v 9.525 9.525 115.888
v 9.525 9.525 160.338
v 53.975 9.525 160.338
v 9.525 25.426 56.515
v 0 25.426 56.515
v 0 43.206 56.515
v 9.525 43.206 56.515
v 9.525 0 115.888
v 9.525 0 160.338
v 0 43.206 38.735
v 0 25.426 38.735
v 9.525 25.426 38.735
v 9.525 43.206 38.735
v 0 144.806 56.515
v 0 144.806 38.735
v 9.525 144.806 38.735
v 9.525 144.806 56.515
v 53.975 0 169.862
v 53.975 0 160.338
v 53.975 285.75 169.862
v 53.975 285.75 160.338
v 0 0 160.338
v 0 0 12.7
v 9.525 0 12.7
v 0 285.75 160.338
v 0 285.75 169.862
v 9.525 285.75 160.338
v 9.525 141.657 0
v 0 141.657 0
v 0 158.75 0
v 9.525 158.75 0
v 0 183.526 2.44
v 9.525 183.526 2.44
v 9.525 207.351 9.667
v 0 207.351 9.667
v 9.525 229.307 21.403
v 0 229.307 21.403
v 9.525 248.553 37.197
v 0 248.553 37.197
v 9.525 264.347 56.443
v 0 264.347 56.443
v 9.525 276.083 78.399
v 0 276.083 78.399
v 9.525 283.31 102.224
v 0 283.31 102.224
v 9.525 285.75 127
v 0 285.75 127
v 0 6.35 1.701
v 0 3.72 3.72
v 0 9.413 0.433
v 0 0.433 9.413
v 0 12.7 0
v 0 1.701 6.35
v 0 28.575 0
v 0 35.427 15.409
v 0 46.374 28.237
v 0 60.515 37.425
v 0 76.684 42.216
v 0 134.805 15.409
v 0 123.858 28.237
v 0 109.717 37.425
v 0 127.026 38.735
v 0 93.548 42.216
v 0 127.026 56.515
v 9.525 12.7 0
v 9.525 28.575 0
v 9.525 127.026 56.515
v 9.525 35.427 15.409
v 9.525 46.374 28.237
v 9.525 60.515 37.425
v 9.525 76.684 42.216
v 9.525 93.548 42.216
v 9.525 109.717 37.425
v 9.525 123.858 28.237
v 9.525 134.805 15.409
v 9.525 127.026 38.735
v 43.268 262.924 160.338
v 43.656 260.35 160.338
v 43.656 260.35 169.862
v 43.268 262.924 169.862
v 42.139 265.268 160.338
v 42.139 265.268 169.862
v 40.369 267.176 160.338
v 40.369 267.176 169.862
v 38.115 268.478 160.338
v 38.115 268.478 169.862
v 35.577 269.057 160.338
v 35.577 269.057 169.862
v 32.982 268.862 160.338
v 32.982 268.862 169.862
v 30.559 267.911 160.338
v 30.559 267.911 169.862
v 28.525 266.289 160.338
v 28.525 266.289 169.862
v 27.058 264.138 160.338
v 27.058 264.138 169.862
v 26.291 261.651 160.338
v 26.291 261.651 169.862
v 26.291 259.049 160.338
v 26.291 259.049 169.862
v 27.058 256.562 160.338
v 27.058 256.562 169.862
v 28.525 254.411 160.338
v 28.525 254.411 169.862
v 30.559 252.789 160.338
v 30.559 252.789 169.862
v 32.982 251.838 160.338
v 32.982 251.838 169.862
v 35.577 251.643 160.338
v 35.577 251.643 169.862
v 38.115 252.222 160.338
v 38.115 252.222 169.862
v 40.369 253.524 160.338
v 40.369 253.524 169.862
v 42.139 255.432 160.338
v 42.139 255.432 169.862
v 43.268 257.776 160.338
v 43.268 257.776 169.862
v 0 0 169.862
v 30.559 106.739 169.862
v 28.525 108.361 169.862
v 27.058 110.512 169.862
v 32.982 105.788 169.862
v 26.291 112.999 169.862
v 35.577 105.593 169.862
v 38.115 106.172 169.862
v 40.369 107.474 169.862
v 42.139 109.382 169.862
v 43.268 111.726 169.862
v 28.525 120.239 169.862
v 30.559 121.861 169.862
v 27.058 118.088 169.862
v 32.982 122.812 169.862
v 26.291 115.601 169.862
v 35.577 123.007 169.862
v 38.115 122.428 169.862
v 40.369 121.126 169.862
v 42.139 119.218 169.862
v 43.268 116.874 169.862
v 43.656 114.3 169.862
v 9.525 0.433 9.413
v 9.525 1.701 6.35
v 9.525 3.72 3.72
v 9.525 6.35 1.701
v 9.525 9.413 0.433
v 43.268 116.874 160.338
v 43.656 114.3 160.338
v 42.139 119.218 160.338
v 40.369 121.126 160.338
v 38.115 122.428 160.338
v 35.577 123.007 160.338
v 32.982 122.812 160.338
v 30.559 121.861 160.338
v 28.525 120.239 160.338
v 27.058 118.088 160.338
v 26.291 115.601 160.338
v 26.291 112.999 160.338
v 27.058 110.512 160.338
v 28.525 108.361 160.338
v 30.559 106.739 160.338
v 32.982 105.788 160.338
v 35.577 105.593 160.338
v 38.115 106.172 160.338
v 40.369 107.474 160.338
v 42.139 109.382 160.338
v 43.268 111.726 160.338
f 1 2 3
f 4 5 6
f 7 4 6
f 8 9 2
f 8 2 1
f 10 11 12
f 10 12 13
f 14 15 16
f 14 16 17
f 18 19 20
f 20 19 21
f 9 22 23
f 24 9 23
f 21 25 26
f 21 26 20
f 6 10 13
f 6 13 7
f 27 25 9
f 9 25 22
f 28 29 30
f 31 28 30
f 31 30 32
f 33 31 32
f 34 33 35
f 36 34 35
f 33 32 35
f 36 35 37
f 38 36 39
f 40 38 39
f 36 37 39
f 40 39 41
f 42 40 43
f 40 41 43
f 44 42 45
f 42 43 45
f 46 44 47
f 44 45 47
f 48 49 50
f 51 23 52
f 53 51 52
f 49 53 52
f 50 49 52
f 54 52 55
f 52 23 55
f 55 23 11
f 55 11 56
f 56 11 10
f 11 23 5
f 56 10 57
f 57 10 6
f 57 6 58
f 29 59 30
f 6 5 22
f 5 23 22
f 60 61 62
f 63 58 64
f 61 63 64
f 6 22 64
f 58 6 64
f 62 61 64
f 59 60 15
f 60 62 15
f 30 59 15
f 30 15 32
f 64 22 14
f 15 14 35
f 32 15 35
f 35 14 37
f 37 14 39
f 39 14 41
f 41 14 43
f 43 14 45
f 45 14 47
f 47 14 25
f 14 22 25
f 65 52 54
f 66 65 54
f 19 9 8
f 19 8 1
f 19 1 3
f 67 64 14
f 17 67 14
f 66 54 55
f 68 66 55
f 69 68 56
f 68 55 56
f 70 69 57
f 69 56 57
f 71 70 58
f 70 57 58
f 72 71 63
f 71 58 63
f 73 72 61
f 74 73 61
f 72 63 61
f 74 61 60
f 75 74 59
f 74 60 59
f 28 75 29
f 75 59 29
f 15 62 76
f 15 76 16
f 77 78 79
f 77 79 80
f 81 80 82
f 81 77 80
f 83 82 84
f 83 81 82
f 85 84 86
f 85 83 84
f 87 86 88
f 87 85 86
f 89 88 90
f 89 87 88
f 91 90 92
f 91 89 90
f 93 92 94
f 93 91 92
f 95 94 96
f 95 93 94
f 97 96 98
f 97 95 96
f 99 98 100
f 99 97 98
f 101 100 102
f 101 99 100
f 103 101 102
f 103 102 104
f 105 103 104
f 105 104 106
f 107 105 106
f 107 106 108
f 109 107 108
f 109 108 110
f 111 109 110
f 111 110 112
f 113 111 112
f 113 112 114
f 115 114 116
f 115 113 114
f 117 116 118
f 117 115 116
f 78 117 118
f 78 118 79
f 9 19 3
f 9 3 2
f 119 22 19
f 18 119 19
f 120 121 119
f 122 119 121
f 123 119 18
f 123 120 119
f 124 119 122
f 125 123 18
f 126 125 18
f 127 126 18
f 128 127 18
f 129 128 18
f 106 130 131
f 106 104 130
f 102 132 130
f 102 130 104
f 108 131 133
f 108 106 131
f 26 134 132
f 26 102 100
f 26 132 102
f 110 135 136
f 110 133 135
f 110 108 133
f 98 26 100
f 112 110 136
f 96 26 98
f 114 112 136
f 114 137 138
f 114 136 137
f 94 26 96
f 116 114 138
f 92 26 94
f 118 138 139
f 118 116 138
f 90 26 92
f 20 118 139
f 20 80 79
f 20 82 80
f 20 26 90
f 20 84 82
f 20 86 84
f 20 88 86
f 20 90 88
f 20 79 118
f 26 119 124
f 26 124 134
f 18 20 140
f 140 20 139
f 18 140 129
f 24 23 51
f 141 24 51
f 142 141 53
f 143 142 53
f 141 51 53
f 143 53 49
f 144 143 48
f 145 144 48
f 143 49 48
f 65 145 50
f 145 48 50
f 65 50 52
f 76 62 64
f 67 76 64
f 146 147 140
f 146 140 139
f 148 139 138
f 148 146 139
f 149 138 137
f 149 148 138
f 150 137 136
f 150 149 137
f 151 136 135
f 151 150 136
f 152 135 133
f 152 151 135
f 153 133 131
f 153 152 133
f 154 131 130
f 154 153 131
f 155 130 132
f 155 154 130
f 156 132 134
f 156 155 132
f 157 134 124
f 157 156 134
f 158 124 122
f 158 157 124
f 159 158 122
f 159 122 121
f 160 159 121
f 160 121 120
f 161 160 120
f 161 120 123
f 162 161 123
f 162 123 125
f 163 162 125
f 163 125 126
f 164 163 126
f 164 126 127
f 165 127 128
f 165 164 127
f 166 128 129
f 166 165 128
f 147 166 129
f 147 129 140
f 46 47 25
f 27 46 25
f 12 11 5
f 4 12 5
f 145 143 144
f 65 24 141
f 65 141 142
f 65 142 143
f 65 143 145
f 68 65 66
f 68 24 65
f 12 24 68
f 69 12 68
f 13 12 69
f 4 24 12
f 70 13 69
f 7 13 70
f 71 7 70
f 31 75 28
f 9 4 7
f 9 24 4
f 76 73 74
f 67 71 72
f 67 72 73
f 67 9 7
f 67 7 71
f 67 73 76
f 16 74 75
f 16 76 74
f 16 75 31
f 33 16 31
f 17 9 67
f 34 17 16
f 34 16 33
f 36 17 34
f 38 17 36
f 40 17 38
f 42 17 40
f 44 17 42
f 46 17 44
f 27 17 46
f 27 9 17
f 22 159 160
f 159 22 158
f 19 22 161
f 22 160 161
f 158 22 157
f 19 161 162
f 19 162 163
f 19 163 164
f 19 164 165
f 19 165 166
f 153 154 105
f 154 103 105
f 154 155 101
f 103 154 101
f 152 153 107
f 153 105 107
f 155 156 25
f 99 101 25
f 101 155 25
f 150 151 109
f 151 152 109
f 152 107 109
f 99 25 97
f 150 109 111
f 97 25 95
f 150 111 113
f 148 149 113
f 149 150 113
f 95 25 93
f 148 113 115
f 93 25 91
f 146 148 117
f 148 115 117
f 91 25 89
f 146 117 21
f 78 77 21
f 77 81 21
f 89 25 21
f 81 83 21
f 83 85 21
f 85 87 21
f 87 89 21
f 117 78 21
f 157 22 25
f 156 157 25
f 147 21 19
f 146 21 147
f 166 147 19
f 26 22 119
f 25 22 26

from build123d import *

# Parameters (mm, degrees)
F0_W     = 17.78
F0_H     = 17.78
F1_DEPTH = 9.525
F2_W     = 53.975
F2_H     = 285.75
F2_R     = 8.73125
F3_DEPTH = 9.525
F5_DEPTH = 9.525


with BuildPart() as f1:
    # F0 (on Right) → F1 (new body)
    with BuildSketch(Plane.YZ):
        with BuildLine():
            Line((0, 160.3375), (0, 12.7))
            ThreePointArc((0, 12.7), (3.719744, 3.719744), (12.7, 0))
            Line((12.7, 0), (28.575, 0))
            ThreePointArc((28.575, 0), (85.115921, 42.824672), (141.656843, 0))
            Line((141.656843, 0), (158.75, 0))
            ThreePointArc((158.75, 0), (248.552561, 37.197439), (285.75, 127))
            Line((285.75, 127), (285.75, 160.3375))
            Line((285.75, 160.3375), (0, 160.3375))
        make_face()
        with Locations((34.315921, 47.625)):
            Rectangle(F0_W, F0_H, mode=Mode.SUBTRACT)
        with Locations((135.915921, 47.625)):
            Rectangle(F0_W, F0_H, mode=Mode.SUBTRACT)
    extrude(amount=F1_DEPTH)


with BuildPart() as f3:
    # F2 (on face) → F3 (new body)
    with BuildSketch(Plane.XY.offset(160.3375)):
        with Locations((26.9875, 142.875)):
            Rectangle(F2_W, F2_H)
        with Locations((34.925, 114.3)):
            Circle(F2_R, mode=Mode.SUBTRACT)
        with Locations((34.925, 260.35)):
            Circle(F2_R, mode=Mode.SUBTRACT)
    extrude(amount=F3_DEPTH)


with BuildPart() as f5:
    # F4 (on face) → F5 (new body)
    with BuildSketch(Plane.XZ):
        Polygon((9.525, 160.3375), (9.525, 115.8875), (53.975, 160.3375), align=None)
    extrude(amount=-F5_DEPTH)


solid = Compound([f1.part, f3.part, f5.part])
